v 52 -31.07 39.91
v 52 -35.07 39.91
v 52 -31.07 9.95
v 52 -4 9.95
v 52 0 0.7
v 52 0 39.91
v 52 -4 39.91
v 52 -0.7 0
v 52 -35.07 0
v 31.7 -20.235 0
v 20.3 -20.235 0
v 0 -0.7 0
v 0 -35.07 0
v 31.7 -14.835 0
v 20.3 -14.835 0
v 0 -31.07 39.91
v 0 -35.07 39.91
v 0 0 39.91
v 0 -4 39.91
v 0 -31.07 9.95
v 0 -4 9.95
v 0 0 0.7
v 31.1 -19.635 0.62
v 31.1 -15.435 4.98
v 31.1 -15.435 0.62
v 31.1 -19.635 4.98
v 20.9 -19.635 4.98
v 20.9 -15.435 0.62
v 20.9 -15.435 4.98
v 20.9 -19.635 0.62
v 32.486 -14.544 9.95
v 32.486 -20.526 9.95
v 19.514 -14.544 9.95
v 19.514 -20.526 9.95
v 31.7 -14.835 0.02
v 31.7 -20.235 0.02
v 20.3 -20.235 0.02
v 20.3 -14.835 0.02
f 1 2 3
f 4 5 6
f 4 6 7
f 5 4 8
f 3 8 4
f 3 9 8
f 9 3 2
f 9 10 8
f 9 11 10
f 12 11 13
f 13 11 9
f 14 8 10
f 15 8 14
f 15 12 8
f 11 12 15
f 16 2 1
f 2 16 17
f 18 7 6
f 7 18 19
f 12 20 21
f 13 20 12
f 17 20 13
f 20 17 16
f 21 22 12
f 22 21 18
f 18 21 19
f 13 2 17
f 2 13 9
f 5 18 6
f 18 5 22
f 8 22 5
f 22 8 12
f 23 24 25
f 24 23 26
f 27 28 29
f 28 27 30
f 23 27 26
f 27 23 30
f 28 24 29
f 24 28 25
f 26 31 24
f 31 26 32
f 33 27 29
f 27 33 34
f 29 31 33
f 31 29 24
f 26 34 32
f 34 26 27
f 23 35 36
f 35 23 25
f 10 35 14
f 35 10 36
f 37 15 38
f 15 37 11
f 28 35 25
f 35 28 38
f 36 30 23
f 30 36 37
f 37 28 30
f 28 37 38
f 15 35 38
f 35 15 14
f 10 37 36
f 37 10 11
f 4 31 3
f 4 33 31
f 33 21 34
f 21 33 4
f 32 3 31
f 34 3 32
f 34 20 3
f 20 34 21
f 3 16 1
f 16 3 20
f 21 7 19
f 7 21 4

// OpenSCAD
// Dance bag name plate base - v3
// Supportless version using a through-slot instead of a blind mortise.
// Recommended print orientation: print_flipped = true

$fn = 48;

// =========================
// BAG BAR MEASUREMENTS
// =========================
bar_w = 27.07;   // front-to-back of bag bar
bar_h = 29.91;   // top-to-bottom of bag bar
clear_w = 0.00;  // tuned from fit tests
clear_h = 0.00;

// =========================
// BASE GEOMETRY
// =========================
base_len   = 52.0;   // along the bar
side_wall  = 4.0;    // left/right wall thickness
top_wall   = 10.0;   // material above saddle cavity
edge_bevel = 0.8;    // small outer top-edge bevel

// =========================
// THROUGH-SLOT / STEM FIT
// =========================
slot_w          = 10.2;  // snug section width for 10.0 mm stem
slot_t          = 4.2;   // snug section thickness for 4.0 mm stem
slot_fit_depth  = 5.0;   // straight, fit-critical section near top surface
relief_w        = 13.0;  // wider lower relief into cavity
relief_t        = 6.0;   // thicker lower relief into cavity
entry_chamfer   = 0.6;   // light top lead-in

// true = model already flipped for print (top face on bed)
print_flipped = true;

// =========================
// DERIVED
// =========================
inner_w = bar_w + clear_w;
inner_h = bar_h + clear_h;

outer_w = inner_w + 2 * side_wall;
outer_h = inner_h + top_wall;

relief_top_z = inner_h + (top_wall - slot_fit_depth);

// =========================
// MAIN
// =========================
if (print_flipped) {
    translate([0, 0, outer_h])
        rotate([180, 0, 0])
            base_v3();
} else {
    base_v3();
}

// =========================
// MODULES
// =========================
module base_v3() {
    difference() {
        outer_block();

        // saddle cavity
        translate([-0.05, side_wall, -0.05])
            cube([base_len + 0.10, inner_w, inner_h + 0.10]);

        // through-slot system
        through_slot();
    }
}

module outer_block() {
    difference() {
        cube([base_len, outer_w, outer_h]);

        // front top bevel (cosmetic only)
        translate([-0.1, -0.1, outer_h - edge_bevel])
            rotate([45, 0, 0])
                cube([base_len + 0.2, 2 * edge_bevel, 2 * edge_bevel]);

        // back top bevel
        translate([-0.1, outer_w + 0.1, outer_h - edge_bevel])
            rotate([-45, 0, 0])
                cube([base_len + 0.2, 2 * edge_bevel, 2 * edge_bevel]);
    }
}

module through_slot() {
    cx = base_len / 2;
    cy = outer_w / 2;

    union() {
        // snug upper section (straight)
        translate([cx - slot_w/2, cy - slot_t/2, relief_top_z])
            cube([slot_w, slot_t, outer_h - relief_top_z + 0.02]);

        // lower relief / taper into the cavity
        hull() {
            // top of relief matches snug section
            translate([cx - slot_w/2, cy - slot_t/2, relief_top_z])
                cube([slot_w, slot_t, 0.02]);

            // bottom of relief opens up into cavity a bit wider
            translate([cx - relief_w/2, cy - relief_t/2, inner_h - 0.02])
                cube([relief_w, relief_t, 0.02]);
        }

        // tiny lead-in chamfer at top face for easier insertion
        hull() {
            translate([cx - (slot_w + 2*entry_chamfer)/2,
                       cy - (slot_t + 2*entry_chamfer)/2,
                       outer_h - 0.02])
                cube([slot_w + 2*entry_chamfer,
                      slot_t + 2*entry_chamfer,
                      0.02]);

            translate([cx - slot_w/2,
                       cy - slot_t/2,
                       outer_h - entry_chamfer - 0.02])
                cube([slot_w, slot_t, 0.02]);
        }
    }
}
